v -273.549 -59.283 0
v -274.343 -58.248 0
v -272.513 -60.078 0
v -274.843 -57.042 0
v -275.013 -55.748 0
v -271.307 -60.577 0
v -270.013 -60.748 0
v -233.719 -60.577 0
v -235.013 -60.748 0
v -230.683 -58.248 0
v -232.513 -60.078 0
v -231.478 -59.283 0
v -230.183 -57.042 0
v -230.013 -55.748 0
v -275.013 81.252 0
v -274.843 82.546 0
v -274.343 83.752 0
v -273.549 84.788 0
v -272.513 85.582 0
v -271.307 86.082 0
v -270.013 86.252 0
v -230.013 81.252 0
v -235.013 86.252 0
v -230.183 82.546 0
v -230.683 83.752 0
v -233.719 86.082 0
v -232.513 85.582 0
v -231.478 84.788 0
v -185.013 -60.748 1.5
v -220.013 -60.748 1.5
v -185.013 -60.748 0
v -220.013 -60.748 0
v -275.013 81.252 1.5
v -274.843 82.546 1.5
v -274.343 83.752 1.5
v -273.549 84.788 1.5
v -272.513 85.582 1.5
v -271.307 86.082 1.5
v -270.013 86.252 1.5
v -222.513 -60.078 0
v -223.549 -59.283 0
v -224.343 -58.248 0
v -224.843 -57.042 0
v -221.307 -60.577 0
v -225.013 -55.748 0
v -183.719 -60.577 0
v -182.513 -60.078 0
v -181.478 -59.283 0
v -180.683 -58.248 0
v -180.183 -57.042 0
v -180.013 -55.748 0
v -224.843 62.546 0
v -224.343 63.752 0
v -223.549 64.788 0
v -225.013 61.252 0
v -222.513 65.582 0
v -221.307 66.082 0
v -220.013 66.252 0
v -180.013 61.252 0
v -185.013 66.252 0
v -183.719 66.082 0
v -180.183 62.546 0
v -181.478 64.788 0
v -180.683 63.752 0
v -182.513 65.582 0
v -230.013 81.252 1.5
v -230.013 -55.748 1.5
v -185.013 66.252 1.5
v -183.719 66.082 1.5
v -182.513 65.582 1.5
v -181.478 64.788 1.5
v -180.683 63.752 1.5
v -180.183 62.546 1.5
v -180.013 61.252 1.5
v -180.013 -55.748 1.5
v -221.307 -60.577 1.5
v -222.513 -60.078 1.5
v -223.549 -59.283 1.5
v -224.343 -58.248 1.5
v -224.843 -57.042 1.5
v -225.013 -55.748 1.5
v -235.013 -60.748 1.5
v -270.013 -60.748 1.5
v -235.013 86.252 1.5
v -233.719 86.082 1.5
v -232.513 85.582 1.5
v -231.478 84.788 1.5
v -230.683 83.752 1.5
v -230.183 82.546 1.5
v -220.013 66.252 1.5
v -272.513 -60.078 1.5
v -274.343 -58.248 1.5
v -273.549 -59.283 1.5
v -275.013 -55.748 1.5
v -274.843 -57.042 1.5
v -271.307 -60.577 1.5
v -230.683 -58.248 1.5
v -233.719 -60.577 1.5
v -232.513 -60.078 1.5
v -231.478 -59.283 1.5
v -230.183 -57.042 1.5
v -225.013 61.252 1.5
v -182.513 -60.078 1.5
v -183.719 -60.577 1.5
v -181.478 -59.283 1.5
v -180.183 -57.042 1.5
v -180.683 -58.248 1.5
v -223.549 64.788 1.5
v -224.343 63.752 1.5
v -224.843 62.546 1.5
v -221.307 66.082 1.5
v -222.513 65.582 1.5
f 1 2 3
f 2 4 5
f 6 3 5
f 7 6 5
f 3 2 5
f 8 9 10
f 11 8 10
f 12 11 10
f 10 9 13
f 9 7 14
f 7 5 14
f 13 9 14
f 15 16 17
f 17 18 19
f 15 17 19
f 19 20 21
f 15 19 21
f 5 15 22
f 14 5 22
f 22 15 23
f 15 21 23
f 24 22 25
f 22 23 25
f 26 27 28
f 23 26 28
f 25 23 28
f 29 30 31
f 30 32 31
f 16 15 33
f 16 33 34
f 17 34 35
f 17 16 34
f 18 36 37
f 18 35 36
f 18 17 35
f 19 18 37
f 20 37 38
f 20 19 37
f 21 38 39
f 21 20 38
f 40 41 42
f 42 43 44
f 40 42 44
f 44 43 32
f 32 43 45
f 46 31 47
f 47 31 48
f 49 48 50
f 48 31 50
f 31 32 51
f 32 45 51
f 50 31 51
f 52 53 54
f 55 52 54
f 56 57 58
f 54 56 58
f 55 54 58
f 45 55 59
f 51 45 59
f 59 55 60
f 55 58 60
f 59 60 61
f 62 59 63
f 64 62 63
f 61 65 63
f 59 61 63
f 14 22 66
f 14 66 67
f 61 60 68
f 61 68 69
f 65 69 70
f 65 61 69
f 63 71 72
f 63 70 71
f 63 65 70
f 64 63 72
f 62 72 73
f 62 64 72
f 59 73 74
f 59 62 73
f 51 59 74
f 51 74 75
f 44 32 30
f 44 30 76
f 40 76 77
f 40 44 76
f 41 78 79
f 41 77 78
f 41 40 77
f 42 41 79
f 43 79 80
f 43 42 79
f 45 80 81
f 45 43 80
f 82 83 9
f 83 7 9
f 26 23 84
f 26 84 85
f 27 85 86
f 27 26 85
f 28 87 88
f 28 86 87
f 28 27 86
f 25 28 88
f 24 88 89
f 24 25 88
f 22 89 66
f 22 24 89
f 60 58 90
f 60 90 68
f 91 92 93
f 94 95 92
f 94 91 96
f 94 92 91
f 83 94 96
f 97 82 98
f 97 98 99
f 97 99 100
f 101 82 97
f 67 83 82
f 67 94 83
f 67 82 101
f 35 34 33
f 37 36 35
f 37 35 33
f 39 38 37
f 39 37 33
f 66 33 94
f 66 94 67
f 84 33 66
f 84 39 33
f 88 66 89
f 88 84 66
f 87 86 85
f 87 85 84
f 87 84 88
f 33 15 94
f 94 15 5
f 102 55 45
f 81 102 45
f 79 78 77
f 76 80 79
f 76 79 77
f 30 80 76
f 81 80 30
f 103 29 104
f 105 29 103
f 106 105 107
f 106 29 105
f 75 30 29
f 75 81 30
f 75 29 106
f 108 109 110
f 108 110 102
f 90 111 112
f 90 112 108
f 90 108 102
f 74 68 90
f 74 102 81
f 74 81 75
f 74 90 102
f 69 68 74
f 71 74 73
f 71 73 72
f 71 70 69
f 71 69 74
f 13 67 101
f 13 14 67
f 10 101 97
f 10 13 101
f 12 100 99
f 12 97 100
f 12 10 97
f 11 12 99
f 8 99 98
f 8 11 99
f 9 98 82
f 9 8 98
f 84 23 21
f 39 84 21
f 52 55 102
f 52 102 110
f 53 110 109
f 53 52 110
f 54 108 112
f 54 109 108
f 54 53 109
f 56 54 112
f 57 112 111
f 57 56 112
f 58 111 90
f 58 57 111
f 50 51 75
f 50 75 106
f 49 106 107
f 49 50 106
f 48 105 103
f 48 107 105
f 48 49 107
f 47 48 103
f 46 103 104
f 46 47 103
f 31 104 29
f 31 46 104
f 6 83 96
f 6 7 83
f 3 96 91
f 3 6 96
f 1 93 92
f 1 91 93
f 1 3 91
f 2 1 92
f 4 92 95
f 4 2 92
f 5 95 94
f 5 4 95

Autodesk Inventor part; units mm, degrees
ref_plane "YZ Plane" through (0, 0, 0) normal (1, 0, 0) x (0, 1, 0)
ref_plane "XZ Plane" through (0, 0, 0) normal (0, 1, 0) x (-1, 0, 0)
ref_plane "XY Plane" through (0, 0, 0) normal (0, 0, 1) x (1, 0, 0)
sketch "Sketch1" plane through (0, 0, 0) normal (0, 0, 1) x (1, 0, 0)
  line L0 (-175.0131, 86.2523) -> (-215.0131, 86.2523)
  line L1 (-225.0131, 76.2523) -> (-225.0131, -50.7477)
  line L2 (-215.0131, -60.7477) -> (-175.0131, -60.7477)
  line L3 (-230.0131, 57.2523) -> (-230.0131, -50.7477)
  arc A0 (-215.0131, 86.2523) -> (-225.0131, 76.2523) centre (-215.0131, 76.2523) ccw
  arc A1 (-225.0131, -50.7477) -> (-215.0131, -60.7477) centre (-215.0131, -50.7477) ccw
  arc A2 (-240.0131, -60.7477) -> (-230.0131, -50.7477) centre (-240.0131, -50.7477) ccw
  arc A3 (-230.0131, 57.2523) -> (-240.0131, 67.2523) centre (-240.0131, 57.2523) ccw
  line L4 (-210.0131, 86.2523) -> (-210.0131, -60.7477)
  circle A4 centre (-210.0131, 12.7523) radius 1.75
  circle A5 centre (-210.0131, -40.7477) radius 1.75
  circle A6 centre (-210.0131, 66.2523) radius 1.75
  line L5 (-235.0131, 86.2523) -> (-270.0131, 86.2523)
  line L6 (-275.0131, 81.2523) -> (-275.0131, -55.7477)
  line L7 (-270.0131, -60.7477) -> (-235.0131, -60.7477)
  line L8 (-230.0131, -55.7477) -> (-230.0131, 81.2523)
  line L9 (-220.0131, 66.2523) -> (-185.0131, 66.2523)
  line L10 (-180.0131, 61.2523) -> (-180.0131, -55.7477)
  line L11 (-185.0131, -60.7477) -> (-220.0131, -60.7477)
  line L12 (-225.0131, -55.7477) -> (-225.0131, 61.2523)
  arc A7 (-180.0131, 61.2523) -> (-185.0131, 66.2523) centre (-185.0131, 61.2523) ccw
  arc A8 (-220.0131, 66.2523) -> (-225.0131, 61.2523) centre (-220.0131, 61.2523) ccw
  arc A9 (-225.0131, -55.7477) -> (-220.0131, -60.7477) centre (-220.0131, -55.7477) ccw
  arc A10 (-185.0131, -60.7477) -> (-180.0131, -55.7477) centre (-185.0131, -55.7477) ccw
  arc A11 (-235.0131, -60.7477) -> (-230.0131, -55.7477) centre (-235.0131, -55.7477) ccw
  arc A12 (-275.0131, -55.7477) -> (-270.0131, -60.7477) centre (-270.0131, -55.7477) ccw
  arc A13 (-270.0131, 86.2523) -> (-275.0131, 81.2523) centre (-270.0131, 81.2523) ccw
  arc A14 (-230.0131, 81.2523) -> (-235.0131, 86.2523) centre (-235.0131, 81.2523) ccw
  point P0 (-225.0131, -60.7477)
  point P1 (-230.0131, -60.7477)
  point P2 (88.9869, -60.7477)
  point P3 (-171.0131, -60.7477)
  point P4 (88.9869, -60.7477)
  point P5 (92.9869, -60.7477)
  point P6 (-171.0131, -60.7477)
  point P7 (92.9869, -60.7477)
  point P8 (88.9869, -60.7477)
  point P9 (-275.0131, -60.7477)
  point P10 (-230.0131, -60.7477)
  point P11 (-180.0131, -60.7477)
  point P12 (-225.0131, -60.7477)
  dimension "d24" = 10
  dimension "d25" = -5
  dimension "d26" = 15
  dimension "d30" = 3.5
  dimension "d32" = 3.5
  dimension "d46" = 45
  dimension "d47" = 45
  dimension "d48" = 5
  dimension "d49" = 5
  dimension "d50" = 5
  dimension "d51" = 5
  dimension "d52" = 3.5
  dimension "d60" = 5
extrude "Extrusion1" add sketch "Sketch1" along normal blind 1.5 contours L9 A6 L4 | L4 A6 L9 | L9 A7 L10 A10 L2 L4 A5 A4 A6 | A6 L4 A4 A5 L2 A1 L1 A8 L9 | A1 L11 A9 L12 | A4 L4 | L4 A4 | A5 L4 | L4 A5 | L3 A2 L7 A12 L6 A13 L5 A14 L8 | L8 A11 L7 A2 picked at (-209.6302, 65.158) picked at (-211.1651, 66.1225)
properties part number "base 2 plate"
